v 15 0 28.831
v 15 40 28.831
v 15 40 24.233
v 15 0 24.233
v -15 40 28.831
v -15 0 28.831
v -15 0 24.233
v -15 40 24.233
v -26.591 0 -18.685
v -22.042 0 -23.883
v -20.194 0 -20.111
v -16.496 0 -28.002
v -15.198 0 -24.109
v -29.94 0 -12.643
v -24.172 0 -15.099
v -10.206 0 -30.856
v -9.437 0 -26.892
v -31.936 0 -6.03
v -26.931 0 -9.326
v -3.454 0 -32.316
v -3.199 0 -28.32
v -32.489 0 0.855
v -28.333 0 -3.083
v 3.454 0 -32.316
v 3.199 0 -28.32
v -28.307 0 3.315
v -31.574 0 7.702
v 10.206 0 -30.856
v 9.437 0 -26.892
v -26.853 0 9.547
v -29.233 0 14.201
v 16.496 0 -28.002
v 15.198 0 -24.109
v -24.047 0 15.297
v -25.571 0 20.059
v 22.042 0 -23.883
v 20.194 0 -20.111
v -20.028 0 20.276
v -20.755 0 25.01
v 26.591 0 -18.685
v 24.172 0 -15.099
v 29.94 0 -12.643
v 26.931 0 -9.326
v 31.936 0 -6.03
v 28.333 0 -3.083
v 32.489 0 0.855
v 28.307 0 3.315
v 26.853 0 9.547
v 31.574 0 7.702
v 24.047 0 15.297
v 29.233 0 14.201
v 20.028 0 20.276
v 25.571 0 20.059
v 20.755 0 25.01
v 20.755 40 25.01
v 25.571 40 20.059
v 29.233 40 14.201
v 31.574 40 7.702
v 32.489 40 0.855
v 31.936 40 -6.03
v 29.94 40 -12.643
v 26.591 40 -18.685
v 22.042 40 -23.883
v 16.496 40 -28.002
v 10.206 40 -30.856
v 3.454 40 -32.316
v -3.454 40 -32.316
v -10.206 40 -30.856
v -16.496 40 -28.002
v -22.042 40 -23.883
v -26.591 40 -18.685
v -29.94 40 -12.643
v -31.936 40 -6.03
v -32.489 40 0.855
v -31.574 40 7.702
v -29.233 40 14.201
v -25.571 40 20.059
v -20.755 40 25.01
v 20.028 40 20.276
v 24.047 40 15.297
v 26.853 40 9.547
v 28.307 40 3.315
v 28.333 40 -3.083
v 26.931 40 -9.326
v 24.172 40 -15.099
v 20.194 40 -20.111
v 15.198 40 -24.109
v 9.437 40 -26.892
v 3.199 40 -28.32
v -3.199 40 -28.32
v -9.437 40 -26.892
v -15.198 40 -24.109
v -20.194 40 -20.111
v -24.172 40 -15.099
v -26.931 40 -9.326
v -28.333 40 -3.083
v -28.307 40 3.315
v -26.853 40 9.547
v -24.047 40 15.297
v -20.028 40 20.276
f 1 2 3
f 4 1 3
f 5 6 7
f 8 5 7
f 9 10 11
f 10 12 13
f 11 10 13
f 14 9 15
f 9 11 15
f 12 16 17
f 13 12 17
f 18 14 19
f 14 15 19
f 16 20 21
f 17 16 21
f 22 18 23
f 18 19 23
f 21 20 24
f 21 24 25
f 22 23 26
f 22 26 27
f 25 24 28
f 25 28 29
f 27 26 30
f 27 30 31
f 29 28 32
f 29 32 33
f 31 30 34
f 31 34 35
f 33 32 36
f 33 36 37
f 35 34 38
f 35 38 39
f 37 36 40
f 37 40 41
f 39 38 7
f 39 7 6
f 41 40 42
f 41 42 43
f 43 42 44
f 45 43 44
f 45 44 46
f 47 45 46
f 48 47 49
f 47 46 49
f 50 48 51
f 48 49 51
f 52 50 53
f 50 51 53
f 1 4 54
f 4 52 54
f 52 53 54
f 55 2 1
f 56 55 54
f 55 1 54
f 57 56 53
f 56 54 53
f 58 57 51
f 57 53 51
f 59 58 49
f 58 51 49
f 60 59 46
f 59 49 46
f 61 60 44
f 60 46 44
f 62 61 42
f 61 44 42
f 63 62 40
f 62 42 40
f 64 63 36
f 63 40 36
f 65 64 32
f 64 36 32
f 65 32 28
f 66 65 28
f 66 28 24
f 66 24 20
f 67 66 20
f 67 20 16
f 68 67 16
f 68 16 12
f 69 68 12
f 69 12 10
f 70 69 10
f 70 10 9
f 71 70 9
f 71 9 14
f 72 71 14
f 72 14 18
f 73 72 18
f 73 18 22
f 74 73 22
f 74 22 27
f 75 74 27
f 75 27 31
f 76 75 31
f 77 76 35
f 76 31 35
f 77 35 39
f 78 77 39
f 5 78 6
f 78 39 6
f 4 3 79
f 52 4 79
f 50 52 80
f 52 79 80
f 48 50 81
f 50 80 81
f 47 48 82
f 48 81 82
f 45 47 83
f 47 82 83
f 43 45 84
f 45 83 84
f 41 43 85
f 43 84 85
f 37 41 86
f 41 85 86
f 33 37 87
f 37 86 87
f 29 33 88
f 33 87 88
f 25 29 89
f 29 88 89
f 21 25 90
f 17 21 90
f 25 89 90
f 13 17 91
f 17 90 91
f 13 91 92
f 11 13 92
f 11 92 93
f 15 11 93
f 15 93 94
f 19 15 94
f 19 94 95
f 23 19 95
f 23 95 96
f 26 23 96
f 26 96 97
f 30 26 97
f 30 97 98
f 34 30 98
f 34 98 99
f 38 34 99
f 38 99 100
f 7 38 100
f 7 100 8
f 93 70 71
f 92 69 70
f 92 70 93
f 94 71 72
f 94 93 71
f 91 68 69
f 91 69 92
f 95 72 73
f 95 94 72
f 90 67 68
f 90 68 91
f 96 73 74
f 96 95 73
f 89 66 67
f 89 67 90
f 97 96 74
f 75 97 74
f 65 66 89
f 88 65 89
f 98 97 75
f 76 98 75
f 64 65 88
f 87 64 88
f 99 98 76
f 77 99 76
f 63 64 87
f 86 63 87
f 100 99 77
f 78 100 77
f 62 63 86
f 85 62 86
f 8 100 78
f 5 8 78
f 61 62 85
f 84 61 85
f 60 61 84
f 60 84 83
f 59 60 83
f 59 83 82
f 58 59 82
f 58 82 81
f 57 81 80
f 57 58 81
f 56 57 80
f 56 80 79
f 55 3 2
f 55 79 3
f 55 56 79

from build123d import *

# Parameters (mm, degrees)
ESBO_O2_R                = 32.5
RESSALTO_EXTRUS_O1_DEPTH = 40
ESBO_O3_R                = 28.5
CORTE_EXTRUS_O1_DEPTH    = 40
ESBO_O4_W                = 30
ESBO_O4_H                = 19.489170569
CORTE_EXTRUS_O2_DEPTH    = 61.930288035


with BuildPart() as part:
    # Esboço2 → Ressalto-extrusão1 (new body)
    with BuildSketch(Plane(origin=(0, 0, 0), x_dir=(1, 0, 0), z_dir=(0, 1, 0))):
        with Locations(Location((0, 0, 0), (0, 0, 270))):
            Circle(ESBO_O2_R)
    extrude(amount=RESSALTO_EXTRUS_O1_DEPTH)

    # Esboço3 → Corte-extrusão1 (cut)
    with BuildSketch(Plane(origin=(0, 40, 0), x_dir=(1, 0, 0), z_dir=(0, 1, 0))):
        with Locations(Location((0, 0, 0), (0, 0, 270))):
            Circle(ESBO_O3_R)
    extrude(amount=-CORTE_EXTRUS_O1_DEPTH, mode=Mode.SUBTRACT)

    # Esboço4 → Corte-extrusão2 (cut, through all)
    with BuildSketch(Plane(origin=(0, 0, 0), x_dir=(1, 0, 0), z_dir=(0, 1, 0))):
        with Locations((0, -26.797609532)):
            Rectangle(ESBO_O4_W, ESBO_O4_H)
    extrude(amount=CORTE_EXTRUS_O2_DEPTH, mode=Mode.SUBTRACT)


solid = part.part
